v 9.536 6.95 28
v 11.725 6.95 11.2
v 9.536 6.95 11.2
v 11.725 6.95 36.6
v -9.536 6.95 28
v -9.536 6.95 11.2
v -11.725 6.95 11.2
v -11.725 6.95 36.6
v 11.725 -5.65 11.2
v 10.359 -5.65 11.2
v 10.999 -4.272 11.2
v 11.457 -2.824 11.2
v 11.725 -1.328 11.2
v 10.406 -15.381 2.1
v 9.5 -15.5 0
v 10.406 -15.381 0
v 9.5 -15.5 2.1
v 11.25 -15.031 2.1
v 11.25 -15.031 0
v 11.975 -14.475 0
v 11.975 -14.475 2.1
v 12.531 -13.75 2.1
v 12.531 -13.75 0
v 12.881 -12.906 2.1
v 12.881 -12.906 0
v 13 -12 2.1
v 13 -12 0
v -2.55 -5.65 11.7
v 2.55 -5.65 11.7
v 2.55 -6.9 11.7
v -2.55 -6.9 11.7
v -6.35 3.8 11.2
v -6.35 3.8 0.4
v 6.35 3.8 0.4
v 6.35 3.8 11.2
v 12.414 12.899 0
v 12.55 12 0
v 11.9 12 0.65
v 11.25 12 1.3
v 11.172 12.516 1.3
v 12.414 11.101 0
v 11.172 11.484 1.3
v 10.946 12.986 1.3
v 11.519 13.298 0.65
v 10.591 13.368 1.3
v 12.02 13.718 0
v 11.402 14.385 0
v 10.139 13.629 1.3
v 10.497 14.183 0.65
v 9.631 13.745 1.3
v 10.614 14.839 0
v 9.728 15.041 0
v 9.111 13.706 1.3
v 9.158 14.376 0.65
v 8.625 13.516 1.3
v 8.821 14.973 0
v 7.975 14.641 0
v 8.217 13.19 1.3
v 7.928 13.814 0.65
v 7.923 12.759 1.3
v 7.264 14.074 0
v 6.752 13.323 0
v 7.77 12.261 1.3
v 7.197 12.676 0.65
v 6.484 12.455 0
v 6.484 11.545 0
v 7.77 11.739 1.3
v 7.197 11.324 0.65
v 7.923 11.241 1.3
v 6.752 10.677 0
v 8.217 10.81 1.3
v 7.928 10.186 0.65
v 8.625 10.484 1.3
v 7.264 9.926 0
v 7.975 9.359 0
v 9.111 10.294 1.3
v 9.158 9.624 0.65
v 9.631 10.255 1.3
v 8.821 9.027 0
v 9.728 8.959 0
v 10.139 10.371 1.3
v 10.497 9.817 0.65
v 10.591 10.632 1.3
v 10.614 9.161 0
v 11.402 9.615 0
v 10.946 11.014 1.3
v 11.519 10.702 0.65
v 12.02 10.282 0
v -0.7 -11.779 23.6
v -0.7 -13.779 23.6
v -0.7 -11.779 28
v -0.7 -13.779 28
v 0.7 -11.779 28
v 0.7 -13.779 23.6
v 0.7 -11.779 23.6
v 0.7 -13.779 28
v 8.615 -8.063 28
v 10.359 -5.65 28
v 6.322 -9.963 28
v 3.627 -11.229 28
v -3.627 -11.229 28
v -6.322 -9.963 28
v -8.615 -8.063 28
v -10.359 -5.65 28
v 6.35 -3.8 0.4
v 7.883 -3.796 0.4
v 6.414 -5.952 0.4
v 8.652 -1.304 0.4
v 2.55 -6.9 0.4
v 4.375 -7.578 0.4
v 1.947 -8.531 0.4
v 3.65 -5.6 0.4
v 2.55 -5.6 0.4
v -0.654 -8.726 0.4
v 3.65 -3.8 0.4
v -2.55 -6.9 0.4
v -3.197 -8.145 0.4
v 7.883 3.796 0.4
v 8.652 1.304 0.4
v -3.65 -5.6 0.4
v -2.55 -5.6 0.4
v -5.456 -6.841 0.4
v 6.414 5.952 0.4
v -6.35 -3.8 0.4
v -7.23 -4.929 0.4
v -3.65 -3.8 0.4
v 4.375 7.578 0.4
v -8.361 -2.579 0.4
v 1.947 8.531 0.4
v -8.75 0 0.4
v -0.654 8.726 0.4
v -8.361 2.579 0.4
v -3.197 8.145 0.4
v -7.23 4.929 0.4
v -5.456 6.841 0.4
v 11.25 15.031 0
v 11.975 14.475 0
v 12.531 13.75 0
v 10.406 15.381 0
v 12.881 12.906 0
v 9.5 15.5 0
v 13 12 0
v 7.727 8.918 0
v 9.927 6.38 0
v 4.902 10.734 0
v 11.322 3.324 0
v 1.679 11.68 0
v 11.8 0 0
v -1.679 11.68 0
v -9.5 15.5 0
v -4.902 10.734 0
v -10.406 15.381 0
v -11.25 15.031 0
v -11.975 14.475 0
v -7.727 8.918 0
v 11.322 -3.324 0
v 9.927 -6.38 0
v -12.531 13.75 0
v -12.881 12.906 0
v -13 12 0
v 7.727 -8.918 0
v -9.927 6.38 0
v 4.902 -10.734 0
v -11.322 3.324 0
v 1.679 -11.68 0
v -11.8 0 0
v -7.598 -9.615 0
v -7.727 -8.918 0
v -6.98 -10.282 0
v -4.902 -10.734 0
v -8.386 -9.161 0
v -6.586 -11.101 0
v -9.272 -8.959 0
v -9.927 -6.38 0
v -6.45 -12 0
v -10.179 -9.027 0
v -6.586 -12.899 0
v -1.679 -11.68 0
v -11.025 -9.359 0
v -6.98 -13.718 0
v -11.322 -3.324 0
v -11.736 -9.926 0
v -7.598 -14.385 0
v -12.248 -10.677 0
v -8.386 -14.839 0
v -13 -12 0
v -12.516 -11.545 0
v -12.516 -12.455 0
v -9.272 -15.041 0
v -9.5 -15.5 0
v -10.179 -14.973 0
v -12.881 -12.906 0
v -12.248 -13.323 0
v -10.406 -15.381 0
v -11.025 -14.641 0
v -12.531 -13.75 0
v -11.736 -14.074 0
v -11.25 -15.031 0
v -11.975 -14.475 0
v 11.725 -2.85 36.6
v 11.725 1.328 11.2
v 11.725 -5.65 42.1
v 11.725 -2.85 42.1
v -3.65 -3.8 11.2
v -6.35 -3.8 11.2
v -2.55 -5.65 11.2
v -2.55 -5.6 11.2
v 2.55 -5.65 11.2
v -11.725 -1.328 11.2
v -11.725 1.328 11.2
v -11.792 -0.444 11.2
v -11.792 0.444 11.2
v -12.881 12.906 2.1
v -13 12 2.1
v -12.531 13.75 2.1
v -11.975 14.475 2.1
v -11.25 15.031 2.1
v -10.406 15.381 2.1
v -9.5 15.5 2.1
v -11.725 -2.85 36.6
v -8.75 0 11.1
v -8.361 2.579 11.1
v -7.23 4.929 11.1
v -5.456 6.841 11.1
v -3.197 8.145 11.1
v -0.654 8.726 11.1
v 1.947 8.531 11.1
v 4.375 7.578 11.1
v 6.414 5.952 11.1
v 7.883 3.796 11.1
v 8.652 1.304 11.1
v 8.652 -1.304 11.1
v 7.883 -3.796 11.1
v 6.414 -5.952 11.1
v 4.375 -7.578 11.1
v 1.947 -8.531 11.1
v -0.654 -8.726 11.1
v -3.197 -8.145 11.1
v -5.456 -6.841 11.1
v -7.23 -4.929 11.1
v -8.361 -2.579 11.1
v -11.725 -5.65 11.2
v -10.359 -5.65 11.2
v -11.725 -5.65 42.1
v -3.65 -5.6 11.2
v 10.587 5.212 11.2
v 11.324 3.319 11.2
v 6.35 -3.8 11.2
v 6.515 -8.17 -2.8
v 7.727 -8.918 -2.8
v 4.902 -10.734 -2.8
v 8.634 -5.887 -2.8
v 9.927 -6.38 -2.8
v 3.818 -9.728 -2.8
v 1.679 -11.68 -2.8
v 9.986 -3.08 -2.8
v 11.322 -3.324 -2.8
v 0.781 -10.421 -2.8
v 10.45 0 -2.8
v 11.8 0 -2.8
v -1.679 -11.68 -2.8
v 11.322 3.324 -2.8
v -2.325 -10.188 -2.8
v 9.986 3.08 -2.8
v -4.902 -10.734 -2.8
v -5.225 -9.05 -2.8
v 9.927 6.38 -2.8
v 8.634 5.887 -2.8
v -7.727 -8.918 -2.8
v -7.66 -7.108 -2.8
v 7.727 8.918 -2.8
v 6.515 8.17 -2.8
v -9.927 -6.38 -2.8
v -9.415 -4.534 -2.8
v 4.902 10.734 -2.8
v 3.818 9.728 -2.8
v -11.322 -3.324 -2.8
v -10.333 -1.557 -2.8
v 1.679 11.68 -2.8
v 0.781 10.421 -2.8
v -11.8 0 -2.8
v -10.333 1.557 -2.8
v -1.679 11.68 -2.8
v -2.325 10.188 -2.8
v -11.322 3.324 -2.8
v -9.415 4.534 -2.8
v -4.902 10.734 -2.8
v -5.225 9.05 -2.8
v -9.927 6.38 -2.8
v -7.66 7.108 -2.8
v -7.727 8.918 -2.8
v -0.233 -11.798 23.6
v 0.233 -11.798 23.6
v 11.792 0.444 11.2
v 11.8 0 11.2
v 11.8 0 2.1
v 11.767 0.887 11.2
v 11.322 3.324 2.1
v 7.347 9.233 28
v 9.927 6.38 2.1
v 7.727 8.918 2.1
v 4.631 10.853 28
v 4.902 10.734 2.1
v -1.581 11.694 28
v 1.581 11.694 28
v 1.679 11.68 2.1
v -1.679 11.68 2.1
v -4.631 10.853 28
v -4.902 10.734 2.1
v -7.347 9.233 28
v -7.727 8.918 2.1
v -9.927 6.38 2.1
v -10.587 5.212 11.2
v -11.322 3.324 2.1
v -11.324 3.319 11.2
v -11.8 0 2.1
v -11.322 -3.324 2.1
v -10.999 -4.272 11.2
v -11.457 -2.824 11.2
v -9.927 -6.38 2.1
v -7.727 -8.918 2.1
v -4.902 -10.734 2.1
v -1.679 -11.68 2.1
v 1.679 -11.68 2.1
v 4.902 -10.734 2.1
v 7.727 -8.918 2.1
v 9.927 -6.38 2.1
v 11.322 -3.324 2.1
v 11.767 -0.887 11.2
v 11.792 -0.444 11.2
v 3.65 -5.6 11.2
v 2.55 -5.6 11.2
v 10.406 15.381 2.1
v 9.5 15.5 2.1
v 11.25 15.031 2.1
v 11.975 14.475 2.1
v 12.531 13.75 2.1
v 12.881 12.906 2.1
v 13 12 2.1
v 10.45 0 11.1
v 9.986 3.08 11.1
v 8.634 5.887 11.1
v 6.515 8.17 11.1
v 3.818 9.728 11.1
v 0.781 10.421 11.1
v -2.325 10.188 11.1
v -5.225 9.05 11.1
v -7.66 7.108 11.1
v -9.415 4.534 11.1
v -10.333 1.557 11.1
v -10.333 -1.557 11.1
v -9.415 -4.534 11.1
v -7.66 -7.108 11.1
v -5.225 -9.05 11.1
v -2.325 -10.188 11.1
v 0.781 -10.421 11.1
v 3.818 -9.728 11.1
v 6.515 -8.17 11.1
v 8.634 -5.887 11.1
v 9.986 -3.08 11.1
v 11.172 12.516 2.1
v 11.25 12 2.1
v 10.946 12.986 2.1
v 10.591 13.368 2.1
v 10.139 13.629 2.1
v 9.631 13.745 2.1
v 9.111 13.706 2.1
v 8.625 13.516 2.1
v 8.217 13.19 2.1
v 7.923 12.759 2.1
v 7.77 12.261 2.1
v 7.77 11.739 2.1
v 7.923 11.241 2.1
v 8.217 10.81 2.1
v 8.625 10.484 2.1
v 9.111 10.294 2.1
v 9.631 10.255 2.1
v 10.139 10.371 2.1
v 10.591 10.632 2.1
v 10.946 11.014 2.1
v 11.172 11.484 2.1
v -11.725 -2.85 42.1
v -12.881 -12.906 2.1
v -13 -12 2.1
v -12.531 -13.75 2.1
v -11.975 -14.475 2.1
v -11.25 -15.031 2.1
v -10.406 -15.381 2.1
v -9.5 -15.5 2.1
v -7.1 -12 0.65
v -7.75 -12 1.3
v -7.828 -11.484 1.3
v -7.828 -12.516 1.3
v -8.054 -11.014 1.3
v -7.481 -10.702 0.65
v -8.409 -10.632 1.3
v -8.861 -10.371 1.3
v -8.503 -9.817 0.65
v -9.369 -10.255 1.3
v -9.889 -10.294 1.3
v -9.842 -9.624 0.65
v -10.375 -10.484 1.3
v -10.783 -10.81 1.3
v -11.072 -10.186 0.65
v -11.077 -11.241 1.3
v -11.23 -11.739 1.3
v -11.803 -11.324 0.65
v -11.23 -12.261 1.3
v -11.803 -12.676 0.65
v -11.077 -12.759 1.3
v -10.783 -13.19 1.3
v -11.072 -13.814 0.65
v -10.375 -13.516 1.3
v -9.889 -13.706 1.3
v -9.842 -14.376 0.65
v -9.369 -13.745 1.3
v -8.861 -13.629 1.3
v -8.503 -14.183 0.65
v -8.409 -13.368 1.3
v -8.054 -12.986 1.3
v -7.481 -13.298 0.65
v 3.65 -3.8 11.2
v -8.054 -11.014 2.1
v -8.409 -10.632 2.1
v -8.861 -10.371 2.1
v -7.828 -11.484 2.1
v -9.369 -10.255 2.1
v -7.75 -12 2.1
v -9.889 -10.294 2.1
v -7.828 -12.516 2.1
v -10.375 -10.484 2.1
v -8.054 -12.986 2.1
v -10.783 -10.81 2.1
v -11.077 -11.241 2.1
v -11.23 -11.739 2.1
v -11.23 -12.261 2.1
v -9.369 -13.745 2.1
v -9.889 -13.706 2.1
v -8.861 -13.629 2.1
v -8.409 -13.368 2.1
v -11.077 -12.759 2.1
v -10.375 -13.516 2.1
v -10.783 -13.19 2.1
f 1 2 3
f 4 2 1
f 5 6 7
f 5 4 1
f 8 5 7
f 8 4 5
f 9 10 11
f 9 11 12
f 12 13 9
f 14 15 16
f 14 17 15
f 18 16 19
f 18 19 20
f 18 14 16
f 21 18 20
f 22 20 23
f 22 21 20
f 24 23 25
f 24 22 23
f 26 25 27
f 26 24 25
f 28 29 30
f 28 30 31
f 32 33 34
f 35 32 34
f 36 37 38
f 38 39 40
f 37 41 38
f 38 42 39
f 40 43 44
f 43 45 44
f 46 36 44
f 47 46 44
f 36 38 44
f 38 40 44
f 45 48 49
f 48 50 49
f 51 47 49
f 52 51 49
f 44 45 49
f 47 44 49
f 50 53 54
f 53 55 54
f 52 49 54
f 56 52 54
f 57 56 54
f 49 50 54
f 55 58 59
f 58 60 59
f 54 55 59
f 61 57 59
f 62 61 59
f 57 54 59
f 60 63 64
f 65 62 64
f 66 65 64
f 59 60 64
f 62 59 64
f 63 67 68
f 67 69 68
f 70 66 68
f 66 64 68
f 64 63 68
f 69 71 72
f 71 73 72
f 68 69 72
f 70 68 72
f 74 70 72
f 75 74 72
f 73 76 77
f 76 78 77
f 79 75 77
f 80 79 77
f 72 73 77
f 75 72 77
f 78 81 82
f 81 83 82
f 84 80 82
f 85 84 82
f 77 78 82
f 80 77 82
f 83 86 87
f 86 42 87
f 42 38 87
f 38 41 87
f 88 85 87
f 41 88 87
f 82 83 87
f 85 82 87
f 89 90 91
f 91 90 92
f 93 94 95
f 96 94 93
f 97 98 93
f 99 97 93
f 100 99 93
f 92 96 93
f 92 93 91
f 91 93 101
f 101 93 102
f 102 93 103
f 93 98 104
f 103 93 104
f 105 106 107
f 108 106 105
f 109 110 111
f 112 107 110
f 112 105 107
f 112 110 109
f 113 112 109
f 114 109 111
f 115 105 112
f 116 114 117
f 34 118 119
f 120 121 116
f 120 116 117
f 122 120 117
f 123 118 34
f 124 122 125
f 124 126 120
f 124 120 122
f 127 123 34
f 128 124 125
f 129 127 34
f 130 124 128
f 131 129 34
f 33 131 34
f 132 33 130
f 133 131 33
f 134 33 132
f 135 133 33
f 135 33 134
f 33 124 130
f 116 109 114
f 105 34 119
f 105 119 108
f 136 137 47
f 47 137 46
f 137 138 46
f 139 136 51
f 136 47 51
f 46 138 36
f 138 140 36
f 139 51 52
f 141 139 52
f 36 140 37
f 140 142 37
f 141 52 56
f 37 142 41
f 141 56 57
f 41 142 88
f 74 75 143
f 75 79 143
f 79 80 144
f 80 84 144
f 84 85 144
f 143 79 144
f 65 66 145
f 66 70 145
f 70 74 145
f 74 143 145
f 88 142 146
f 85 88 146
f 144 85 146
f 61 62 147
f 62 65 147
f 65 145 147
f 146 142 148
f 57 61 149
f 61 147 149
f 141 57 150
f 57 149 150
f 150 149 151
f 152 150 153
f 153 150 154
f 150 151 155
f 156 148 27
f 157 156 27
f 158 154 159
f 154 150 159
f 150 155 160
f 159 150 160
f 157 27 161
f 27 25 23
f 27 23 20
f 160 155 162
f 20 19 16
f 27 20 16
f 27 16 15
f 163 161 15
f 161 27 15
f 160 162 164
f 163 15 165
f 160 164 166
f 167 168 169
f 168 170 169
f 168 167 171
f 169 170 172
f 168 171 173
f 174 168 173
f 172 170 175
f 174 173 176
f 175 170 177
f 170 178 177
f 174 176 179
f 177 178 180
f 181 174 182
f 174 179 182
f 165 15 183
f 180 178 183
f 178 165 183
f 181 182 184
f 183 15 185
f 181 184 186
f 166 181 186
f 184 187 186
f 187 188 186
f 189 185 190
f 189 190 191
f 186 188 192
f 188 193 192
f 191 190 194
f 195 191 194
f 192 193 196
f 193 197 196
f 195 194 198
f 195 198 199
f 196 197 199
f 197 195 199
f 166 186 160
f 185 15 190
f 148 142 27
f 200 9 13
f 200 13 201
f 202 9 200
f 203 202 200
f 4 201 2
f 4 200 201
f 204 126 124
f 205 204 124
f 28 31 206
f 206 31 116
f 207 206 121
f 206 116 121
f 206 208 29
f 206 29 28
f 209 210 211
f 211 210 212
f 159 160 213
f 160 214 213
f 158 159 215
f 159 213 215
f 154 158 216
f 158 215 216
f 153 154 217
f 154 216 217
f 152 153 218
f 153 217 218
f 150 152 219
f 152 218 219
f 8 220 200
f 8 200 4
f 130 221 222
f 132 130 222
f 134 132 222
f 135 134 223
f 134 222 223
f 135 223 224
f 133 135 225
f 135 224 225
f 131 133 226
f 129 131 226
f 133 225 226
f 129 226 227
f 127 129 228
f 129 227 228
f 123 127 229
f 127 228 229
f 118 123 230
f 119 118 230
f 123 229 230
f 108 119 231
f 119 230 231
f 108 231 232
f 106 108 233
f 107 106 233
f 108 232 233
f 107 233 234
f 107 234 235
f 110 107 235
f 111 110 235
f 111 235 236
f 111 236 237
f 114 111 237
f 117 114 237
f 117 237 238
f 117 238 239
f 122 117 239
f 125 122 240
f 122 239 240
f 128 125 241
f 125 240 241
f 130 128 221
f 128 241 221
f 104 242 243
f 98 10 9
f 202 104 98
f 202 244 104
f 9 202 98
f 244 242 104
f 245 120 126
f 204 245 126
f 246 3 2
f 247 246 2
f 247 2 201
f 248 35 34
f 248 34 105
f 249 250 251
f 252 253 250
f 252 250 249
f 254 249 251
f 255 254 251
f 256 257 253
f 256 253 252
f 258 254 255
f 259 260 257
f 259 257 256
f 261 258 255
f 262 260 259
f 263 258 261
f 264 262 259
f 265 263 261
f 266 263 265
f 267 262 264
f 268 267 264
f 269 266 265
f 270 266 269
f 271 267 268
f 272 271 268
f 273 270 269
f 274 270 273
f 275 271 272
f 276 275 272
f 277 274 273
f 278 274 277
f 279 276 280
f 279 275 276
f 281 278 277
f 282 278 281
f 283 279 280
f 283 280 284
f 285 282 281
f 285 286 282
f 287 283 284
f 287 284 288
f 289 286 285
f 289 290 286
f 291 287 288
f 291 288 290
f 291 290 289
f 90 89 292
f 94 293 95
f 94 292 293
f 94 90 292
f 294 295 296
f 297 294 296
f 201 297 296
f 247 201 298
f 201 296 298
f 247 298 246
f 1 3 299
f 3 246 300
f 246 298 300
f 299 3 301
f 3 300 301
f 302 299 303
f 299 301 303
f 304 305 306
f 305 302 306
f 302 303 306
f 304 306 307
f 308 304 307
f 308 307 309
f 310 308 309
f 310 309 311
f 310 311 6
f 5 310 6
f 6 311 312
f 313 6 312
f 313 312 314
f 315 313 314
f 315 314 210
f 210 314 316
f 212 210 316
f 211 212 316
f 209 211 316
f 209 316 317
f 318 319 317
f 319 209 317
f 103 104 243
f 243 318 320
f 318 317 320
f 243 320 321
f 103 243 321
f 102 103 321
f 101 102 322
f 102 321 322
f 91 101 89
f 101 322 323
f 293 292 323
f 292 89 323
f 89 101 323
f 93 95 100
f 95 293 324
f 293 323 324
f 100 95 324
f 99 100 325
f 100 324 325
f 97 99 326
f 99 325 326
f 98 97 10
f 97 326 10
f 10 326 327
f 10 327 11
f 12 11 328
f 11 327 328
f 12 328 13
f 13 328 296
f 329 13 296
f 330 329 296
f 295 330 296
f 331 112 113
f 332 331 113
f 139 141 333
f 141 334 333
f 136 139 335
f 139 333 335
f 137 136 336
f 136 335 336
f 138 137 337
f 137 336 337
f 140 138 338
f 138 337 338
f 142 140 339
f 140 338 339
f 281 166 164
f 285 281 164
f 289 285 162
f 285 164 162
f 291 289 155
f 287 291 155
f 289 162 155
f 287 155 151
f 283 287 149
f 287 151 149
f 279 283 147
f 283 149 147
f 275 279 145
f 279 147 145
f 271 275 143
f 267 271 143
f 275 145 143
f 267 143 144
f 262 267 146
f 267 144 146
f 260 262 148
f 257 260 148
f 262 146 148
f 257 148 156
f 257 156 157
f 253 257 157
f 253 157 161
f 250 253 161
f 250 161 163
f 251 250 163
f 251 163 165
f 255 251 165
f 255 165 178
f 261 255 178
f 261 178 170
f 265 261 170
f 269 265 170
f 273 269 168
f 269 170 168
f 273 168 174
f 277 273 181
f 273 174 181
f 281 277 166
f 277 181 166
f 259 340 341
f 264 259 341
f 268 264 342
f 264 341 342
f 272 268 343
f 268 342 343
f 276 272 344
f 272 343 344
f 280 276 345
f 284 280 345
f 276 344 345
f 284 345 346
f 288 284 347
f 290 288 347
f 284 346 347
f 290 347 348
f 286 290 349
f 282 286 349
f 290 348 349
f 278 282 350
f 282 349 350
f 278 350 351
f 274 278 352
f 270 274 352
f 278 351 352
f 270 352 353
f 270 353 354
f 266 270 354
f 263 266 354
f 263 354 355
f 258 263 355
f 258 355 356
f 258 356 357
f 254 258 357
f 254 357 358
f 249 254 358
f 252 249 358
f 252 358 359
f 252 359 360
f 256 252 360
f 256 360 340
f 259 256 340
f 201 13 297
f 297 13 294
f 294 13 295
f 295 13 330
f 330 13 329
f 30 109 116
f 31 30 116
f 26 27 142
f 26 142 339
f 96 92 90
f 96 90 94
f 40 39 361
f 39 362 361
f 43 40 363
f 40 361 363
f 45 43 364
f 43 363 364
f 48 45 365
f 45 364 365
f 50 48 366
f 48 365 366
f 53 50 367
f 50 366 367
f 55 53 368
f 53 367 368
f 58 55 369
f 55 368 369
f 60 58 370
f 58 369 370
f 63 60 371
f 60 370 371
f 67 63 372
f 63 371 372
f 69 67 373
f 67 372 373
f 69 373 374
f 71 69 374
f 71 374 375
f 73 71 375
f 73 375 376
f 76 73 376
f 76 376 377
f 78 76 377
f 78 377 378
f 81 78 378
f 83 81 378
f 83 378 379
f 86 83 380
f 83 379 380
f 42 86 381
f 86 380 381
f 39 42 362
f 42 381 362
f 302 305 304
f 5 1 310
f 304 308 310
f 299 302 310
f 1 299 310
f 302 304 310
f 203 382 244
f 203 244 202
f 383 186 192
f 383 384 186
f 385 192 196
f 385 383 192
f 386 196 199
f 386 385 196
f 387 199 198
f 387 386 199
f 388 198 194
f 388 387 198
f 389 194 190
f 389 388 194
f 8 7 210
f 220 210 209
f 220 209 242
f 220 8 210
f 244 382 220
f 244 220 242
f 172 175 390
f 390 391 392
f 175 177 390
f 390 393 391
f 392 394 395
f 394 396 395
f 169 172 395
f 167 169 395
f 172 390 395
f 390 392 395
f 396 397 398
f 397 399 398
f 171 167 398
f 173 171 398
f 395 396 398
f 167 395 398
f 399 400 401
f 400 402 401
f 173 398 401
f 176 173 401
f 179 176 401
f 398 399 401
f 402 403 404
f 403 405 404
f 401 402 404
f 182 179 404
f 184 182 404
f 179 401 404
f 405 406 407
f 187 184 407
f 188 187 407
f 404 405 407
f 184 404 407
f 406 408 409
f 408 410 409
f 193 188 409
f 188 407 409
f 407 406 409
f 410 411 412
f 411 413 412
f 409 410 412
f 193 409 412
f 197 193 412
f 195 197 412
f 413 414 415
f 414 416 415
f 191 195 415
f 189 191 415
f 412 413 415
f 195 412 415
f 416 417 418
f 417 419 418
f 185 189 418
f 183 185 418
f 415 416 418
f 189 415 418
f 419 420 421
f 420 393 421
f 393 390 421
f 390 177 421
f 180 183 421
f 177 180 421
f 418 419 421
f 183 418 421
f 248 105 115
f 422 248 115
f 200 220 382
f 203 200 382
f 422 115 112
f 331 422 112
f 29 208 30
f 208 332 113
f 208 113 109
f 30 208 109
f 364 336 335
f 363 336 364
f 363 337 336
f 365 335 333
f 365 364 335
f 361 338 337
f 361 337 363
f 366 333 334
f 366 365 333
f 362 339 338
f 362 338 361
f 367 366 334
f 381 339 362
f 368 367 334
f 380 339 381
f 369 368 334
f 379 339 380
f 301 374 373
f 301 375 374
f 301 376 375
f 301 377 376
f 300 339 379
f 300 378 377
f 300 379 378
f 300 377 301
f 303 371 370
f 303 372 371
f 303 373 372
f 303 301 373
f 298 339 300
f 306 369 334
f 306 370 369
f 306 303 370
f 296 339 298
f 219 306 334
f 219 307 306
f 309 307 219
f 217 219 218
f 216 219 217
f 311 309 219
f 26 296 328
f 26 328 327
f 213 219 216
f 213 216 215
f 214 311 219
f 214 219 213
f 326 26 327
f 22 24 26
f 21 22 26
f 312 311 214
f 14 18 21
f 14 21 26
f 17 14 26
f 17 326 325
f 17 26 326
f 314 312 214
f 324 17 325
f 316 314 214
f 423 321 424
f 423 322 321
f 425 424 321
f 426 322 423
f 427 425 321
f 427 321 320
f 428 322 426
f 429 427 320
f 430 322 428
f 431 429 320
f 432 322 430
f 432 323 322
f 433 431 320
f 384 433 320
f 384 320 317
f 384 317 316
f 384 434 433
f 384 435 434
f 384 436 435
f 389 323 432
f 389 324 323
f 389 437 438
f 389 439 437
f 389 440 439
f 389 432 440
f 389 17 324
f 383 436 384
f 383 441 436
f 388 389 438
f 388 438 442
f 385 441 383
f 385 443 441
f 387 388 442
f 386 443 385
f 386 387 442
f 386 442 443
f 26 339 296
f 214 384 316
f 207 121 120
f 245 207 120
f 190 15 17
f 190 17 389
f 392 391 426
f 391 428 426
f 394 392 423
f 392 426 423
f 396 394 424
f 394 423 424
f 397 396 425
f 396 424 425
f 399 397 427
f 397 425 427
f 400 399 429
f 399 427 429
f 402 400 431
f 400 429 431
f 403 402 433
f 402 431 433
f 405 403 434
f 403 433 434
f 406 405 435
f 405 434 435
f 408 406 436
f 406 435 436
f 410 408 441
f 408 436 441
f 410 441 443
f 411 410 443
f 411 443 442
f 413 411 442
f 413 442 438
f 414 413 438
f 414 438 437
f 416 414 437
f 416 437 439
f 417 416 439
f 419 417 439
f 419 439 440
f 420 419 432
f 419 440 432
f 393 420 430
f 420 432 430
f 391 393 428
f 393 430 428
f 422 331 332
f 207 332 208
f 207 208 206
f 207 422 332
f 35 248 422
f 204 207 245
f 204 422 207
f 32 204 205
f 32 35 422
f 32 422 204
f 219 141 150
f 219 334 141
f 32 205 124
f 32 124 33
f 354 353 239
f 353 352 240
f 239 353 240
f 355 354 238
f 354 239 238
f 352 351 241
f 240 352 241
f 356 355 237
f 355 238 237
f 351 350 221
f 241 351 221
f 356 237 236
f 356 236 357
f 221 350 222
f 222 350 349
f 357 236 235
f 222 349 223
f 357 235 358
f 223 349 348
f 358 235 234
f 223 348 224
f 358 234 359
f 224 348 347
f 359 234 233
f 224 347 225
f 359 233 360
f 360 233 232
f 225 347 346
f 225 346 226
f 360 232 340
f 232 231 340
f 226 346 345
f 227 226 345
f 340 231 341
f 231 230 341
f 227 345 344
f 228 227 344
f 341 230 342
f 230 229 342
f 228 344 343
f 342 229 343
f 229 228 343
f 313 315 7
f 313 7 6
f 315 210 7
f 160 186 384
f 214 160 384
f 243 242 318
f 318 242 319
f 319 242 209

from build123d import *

# Parameters (mm, degrees)
ESQUISSE1_W                                    = 26
ESQUISSE1_H                                    = 27.3
BOSS_EXTRU_1_DEPTH                             = 2.1
ESQUISSE2_R                                    = 11.8
BOSS_EXTRU_2_DEPTH                             = 40
ESQUISSE3_W                                    = 26
ESQUISSE3_H                                    = 2.1
BOSS_EXTRU_3_DEPTH                             = 3.7
ESQUISSE4_R                                    = 11.8
BOSS_EXTRU_4_DEPTH                             = 2.8
D_GAGEMENT_M181_D                              = 20.9
D_GAGEMENT_M181_DEPTH                          = 13.9
ESQUISSE7_R                                    = 8.75
BOSS_EXTRU_5_DEPTH                             = 10.7
ENL_V_MAT_EXTRU_1_DEPTH                        = 10.8
ESQUISSE9_W                                    = 5.1
ESQUISSE9_H                                    = 1.25
ENL_V_MAT_EXTRU_2_DEPTH                        = 0.5
ENL_V_MAT_EXTRU_3_DEPTH                        = 30.9
BOSS_EXTRU_6_DEPTH                             = 30.9
ENL_V_MAT_EXTRU_4_DEPTH                        = 30.9
BOSS_EXTRU_7_DEPTH                             = 30.9
BOSS_EXTRU_8_DEPTH                             = 30.9
BOSS_EXTRU_9_DEPTH                             = 30.9
ENL_V_MAT_EXTRU_5_REACH                        = 16.1
ENL_V_MAT_EXTRU_6_REACH                        = 16.1
ESQUISSE20_W                                   = 5.5
ESQUISSE20_H                                   = 9.8
ENL_V_MAT_EXTRU_7_DEPTH                        = 25.725
BOSS_EXTRU_10_REACH                            = 31.279
ESQUISSE21_W                                   = 1.4
ESQUISSE21_H                                   = 4.4
FRAISAGE_POUR_VIS_T_TE_FRAIS_E_M31_D           = 3.5
FRAISAGE_POUR_VIS_T_TE_FRAIS_E_M31_DEPTH       = 42.1
FRAISAGE_POUR_VIS_T_TE_FRAIS_E_M31_CSINK_D     = 6.099893765
FRAISAGE_POUR_VIS_T_TE_FRAIS_E_M31_CSINK_ANGLE = 89.999002
CONG_1_R                                       = 3.5


with BuildPart() as part:
    # Esquisse1 → Boss.-Extru.1 (new body)
    with BuildSketch(Plane(origin=(0, 0, 0), x_dir=(-1, 0, 0), z_dir=(0, 0, -1))):
        with Locations((0, -1.85)):
            Rectangle(ESQUISSE1_W, ESQUISSE1_H)
    extrude(amount=-BOSS_EXTRU_1_DEPTH)

    # Esquisse2 → Boss.-Extru.2 (add)
    with BuildSketch(Plane.XY.offset(2.1)):
        Circle(ESQUISSE2_R)
    extrude(amount=BOSS_EXTRU_2_DEPTH)

    # Esquisse3 → Boss.-Extru.3 (add)
    with BuildSketch(Plane(origin=(0, 11.8, 0), x_dir=(-1, 0, 0), z_dir=(0, 1, 0))):
        with Locations((0, 1.05)):
            Rectangle(ESQUISSE3_W, ESQUISSE3_H)
    extrude(amount=BOSS_EXTRU_3_DEPTH)

    # Esquisse4 → Boss.-Extru.4 (add)
    with BuildSketch(Plane(origin=(0, 0, 0), x_dir=(-1, 0, 0), z_dir=(0, 0, -1))):
        Circle(ESQUISSE4_R)
    extrude(amount=BOSS_EXTRU_4_DEPTH)

    # Dégagement M181
    with Locations(Plane(origin=(0, 0, -2.8), x_dir=(-1, 0, 0), z_dir=(0, 0, -1))):
        with Locations((0, 0)):
            Hole(D_GAGEMENT_M181_D / 2, depth=D_GAGEMENT_M181_DEPTH)

    # Esquisse7 → Boss.-Extru.5 (add)
    with BuildSketch(Plane(origin=(0, 0, 11.1), x_dir=(-1, 0, 0), z_dir=(0, 0, -1))):
        Circle(ESQUISSE7_R)
    extrude(amount=BOSS_EXTRU_5_DEPTH)

    # Esquisse8 → Enlèv. mat.-Extru.1 (cut)
    with BuildSketch(Plane(origin=(0, 0, 0.4), x_dir=(-1, 0, 0), z_dir=(0, 0, -1))):
        Polygon((6.35, -3.8), (6.35, 3.8), (-6.35, 3.8), (-6.35, -3.8), (-3.65, -3.8), (-3.65, -5.6), (-2.55, -5.6), (-2.55, -6.9), (2.55, -6.9), (2.55, -5.6), (3.65, -5.6), (3.65, -3.8), align=None)
    extrude(amount=-ENL_V_MAT_EXTRU_1_DEPTH, mode=Mode.SUBTRACT)

    # Esquisse9 → Enlèv. mat.-Extru.2 (cut)
    with BuildSketch(Plane(origin=(0, 0, 11.2), x_dir=(-1, 0, 0), z_dir=(0, 0, -1))):
        with Locations((0, -6.275)):
            Rectangle(ESQUISSE9_W, ESQUISSE9_H)
    extrude(amount=-ENL_V_MAT_EXTRU_2_DEPTH, mode=Mode.SUBTRACT)

    # Esquisse10 → Enlèv. mat.-Extru.3 (cut)
    with BuildSketch(Plane.XY.offset(42.1)):
        with BuildLine():
            Line((-11.725, -1.328297783), (-11.725, 1.328297783))
            ThreePointArc((-11.725, 1.328297783), (-11.8, 0), (-11.725, -1.328297783))
        make_face()
    extrude(amount=-ENL_V_MAT_EXTRU_3_DEPTH, mode=Mode.SUBTRACT)

    # Esquisse11 → Boss.-Extru.6 (add)
    with BuildSketch(Plane.XY.offset(42.1)):
        with BuildLine():
            Line((-9.536115561, 6.95), (-11.725, 6.95))
            Line((-11.725, 6.95), (-11.725, 1.328297783))
            ThreePointArc((-11.725, 1.328297783), (-10.995892082, 4.281396655), (-9.536115561, 6.95))
        make_face()
    extrude(amount=-BOSS_EXTRU_6_DEPTH)

    # Esquisse12 → Enlèv. mat.-Extru.4 (cut)
    with BuildSketch(Plane.XY.offset(42.1)):
        with BuildLine():
            Line((11.725, 1.328297783), (11.725, -1.328297783))
            ThreePointArc((11.725, -1.328297783), (11.8, 0), (11.725, 1.328297783))
        make_face()
    extrude(amount=-ENL_V_MAT_EXTRU_4_DEPTH, mode=Mode.SUBTRACT)

    # Esquisse13 → Boss.-Extru.7 (add)
    with BuildSketch(Plane.XY.offset(42.1)):
        with BuildLine():
            Line((11.725, 1.328297783), (11.725, 6.95))
            Line((11.725, 6.95), (9.536115561, 6.95))
            ThreePointArc((9.536115561, 6.95), (10.995892082, 4.281396655), (11.725, 1.328297783))
        make_face()
    extrude(amount=-BOSS_EXTRU_7_DEPTH)

    # Esquisse14 → Boss.-Extru.8 (add)
    with BuildSketch(Plane.XY.offset(42.1)):
        with BuildLine():
            Line((-11.725, -1.328297783), (-11.725, -5.65))
            Line((-11.725, -5.65), (-10.359416007, -5.65))
            ThreePointArc((-10.359416007, -5.65), (-11.251650328, -3.555329084), (-11.725, -1.328297783))
        make_face()
    extrude(amount=-BOSS_EXTRU_8_DEPTH)

    # Esquisse15 → Boss.-Extru.9 (add)
    with BuildSketch(Plane.XY.offset(42.1)):
        with BuildLine():
            Line((10.359416007, -5.65), (11.725, -5.65))
            Line((11.725, -5.65), (11.725, -1.328297783))
            ThreePointArc((11.725, -1.328297783), (11.251650328, -3.555329084), (10.359416007, -5.65))
        make_face()
    extrude(amount=-BOSS_EXTRU_9_DEPTH)

    # Esquisse17 → Enlèv. mat.-Extru.5 (cut, up to next)
    with BuildSketch(Plane(origin=(0, 0, 28), x_dir=(-1, 0, 0), z_dir=(0, 0, -1)), mode=Mode.PRIVATE) as enl_v_mat_extru_5_sk1:
        with BuildLine():
            Line((-9.536115561, 6.95), (9.536115561, 6.95))
            ThreePointArc((9.536115561, 6.95), (0, 11.8), (-9.536115561, 6.95))
        make_face()
    enl_v_mat_extru_5_tool1 = extrude(enl_v_mat_extru_5_sk1.sketch, amount=-ENL_V_MAT_EXTRU_5_REACH, mode=Mode.PRIVATE) & part.part
    add(enl_v_mat_extru_5_tool1.solids().sort_by_distance((0, 8.928831, 28))[0], mode=Mode.SUBTRACT)

    # Esquisse19 → Enlèv. mat.-Extru.6 (cut, up to next)
    with BuildSketch(Plane(origin=(0, 0, 28), x_dir=(-1, 0, 0), z_dir=(0, 0, -1)), mode=Mode.PRIVATE) as enl_v_mat_extru_6_sk1:
        with BuildLine():
            Line((10.359416007, -5.65), (-10.359416007, -5.65))
            ThreePointArc((-10.359416007, -5.65), (0, -11.8), (10.359416007, -5.65))
        make_face()
    enl_v_mat_extru_6_tool1 = extrude(enl_v_mat_extru_6_sk1.sketch, amount=-ENL_V_MAT_EXTRU_6_REACH, mode=Mode.PRIVATE) & part.part
    add(enl_v_mat_extru_6_tool1.solids().sort_by_distance((0, -8.174843, 28))[0], mode=Mode.SUBTRACT)

    # Esquisse20 → Enlèv. mat.-Extru.7 (cut, through all)
    with BuildSketch(Plane.ZY.offset(11.725)):
        with Locations((39.35, 2.05)):
            Rectangle(ESQUISSE20_W, ESQUISSE20_H)
    extrude(amount=-ENL_V_MAT_EXTRU_7_DEPTH, mode=Mode.SUBTRACT)

    # Esquisse21 → Boss.-Extru.10 (add, up to next)
    with BuildSketch(Plane.XZ.offset(13.779218989), mode=Mode.PRIVATE) as boss_extru_10_sk1:
        with Locations((0, 25.8)):
            Rectangle(ESQUISSE21_W, ESQUISSE21_H)
    boss_extru_10_tool1 = extrude(boss_extru_10_sk1.sketch, amount=-BOSS_EXTRU_10_REACH, mode=Mode.PRIVATE) - part.part
    add(boss_extru_10_tool1.solids().sort_by_distance((0, -13.779219, 25.8))[0])

    # Fraisage pour vis à tête fraisée M31
    with Locations(Plane(origin=(0, 0, 0), x_dir=(-1, 0, 0), z_dir=(0, 0, -1))):
        with Locations((-9.5, 12), (9.5, -12)):
            CounterSinkHole(FRAISAGE_POUR_VIS_T_TE_FRAIS_E_M31_D / 2, FRAISAGE_POUR_VIS_T_TE_FRAIS_E_M31_CSINK_D / 2, depth=FRAISAGE_POUR_VIS_T_TE_FRAIS_E_M31_DEPTH, counter_sink_angle=FRAISAGE_POUR_VIS_T_TE_FRAIS_E_M31_CSINK_ANGLE)

    # Congé1
    cong_1_edges = [part.edges().sort_by_distance(p)[0] for p in [
        (13, 15.5, 1.05),
        (-13, 15.5, 1.05),
        (-13, -15.5, 1.05),
        (13, -15.5, 1.05),
    ]]
    fillet(cong_1_edges, radius=CONG_1_R)


solid = part.part
